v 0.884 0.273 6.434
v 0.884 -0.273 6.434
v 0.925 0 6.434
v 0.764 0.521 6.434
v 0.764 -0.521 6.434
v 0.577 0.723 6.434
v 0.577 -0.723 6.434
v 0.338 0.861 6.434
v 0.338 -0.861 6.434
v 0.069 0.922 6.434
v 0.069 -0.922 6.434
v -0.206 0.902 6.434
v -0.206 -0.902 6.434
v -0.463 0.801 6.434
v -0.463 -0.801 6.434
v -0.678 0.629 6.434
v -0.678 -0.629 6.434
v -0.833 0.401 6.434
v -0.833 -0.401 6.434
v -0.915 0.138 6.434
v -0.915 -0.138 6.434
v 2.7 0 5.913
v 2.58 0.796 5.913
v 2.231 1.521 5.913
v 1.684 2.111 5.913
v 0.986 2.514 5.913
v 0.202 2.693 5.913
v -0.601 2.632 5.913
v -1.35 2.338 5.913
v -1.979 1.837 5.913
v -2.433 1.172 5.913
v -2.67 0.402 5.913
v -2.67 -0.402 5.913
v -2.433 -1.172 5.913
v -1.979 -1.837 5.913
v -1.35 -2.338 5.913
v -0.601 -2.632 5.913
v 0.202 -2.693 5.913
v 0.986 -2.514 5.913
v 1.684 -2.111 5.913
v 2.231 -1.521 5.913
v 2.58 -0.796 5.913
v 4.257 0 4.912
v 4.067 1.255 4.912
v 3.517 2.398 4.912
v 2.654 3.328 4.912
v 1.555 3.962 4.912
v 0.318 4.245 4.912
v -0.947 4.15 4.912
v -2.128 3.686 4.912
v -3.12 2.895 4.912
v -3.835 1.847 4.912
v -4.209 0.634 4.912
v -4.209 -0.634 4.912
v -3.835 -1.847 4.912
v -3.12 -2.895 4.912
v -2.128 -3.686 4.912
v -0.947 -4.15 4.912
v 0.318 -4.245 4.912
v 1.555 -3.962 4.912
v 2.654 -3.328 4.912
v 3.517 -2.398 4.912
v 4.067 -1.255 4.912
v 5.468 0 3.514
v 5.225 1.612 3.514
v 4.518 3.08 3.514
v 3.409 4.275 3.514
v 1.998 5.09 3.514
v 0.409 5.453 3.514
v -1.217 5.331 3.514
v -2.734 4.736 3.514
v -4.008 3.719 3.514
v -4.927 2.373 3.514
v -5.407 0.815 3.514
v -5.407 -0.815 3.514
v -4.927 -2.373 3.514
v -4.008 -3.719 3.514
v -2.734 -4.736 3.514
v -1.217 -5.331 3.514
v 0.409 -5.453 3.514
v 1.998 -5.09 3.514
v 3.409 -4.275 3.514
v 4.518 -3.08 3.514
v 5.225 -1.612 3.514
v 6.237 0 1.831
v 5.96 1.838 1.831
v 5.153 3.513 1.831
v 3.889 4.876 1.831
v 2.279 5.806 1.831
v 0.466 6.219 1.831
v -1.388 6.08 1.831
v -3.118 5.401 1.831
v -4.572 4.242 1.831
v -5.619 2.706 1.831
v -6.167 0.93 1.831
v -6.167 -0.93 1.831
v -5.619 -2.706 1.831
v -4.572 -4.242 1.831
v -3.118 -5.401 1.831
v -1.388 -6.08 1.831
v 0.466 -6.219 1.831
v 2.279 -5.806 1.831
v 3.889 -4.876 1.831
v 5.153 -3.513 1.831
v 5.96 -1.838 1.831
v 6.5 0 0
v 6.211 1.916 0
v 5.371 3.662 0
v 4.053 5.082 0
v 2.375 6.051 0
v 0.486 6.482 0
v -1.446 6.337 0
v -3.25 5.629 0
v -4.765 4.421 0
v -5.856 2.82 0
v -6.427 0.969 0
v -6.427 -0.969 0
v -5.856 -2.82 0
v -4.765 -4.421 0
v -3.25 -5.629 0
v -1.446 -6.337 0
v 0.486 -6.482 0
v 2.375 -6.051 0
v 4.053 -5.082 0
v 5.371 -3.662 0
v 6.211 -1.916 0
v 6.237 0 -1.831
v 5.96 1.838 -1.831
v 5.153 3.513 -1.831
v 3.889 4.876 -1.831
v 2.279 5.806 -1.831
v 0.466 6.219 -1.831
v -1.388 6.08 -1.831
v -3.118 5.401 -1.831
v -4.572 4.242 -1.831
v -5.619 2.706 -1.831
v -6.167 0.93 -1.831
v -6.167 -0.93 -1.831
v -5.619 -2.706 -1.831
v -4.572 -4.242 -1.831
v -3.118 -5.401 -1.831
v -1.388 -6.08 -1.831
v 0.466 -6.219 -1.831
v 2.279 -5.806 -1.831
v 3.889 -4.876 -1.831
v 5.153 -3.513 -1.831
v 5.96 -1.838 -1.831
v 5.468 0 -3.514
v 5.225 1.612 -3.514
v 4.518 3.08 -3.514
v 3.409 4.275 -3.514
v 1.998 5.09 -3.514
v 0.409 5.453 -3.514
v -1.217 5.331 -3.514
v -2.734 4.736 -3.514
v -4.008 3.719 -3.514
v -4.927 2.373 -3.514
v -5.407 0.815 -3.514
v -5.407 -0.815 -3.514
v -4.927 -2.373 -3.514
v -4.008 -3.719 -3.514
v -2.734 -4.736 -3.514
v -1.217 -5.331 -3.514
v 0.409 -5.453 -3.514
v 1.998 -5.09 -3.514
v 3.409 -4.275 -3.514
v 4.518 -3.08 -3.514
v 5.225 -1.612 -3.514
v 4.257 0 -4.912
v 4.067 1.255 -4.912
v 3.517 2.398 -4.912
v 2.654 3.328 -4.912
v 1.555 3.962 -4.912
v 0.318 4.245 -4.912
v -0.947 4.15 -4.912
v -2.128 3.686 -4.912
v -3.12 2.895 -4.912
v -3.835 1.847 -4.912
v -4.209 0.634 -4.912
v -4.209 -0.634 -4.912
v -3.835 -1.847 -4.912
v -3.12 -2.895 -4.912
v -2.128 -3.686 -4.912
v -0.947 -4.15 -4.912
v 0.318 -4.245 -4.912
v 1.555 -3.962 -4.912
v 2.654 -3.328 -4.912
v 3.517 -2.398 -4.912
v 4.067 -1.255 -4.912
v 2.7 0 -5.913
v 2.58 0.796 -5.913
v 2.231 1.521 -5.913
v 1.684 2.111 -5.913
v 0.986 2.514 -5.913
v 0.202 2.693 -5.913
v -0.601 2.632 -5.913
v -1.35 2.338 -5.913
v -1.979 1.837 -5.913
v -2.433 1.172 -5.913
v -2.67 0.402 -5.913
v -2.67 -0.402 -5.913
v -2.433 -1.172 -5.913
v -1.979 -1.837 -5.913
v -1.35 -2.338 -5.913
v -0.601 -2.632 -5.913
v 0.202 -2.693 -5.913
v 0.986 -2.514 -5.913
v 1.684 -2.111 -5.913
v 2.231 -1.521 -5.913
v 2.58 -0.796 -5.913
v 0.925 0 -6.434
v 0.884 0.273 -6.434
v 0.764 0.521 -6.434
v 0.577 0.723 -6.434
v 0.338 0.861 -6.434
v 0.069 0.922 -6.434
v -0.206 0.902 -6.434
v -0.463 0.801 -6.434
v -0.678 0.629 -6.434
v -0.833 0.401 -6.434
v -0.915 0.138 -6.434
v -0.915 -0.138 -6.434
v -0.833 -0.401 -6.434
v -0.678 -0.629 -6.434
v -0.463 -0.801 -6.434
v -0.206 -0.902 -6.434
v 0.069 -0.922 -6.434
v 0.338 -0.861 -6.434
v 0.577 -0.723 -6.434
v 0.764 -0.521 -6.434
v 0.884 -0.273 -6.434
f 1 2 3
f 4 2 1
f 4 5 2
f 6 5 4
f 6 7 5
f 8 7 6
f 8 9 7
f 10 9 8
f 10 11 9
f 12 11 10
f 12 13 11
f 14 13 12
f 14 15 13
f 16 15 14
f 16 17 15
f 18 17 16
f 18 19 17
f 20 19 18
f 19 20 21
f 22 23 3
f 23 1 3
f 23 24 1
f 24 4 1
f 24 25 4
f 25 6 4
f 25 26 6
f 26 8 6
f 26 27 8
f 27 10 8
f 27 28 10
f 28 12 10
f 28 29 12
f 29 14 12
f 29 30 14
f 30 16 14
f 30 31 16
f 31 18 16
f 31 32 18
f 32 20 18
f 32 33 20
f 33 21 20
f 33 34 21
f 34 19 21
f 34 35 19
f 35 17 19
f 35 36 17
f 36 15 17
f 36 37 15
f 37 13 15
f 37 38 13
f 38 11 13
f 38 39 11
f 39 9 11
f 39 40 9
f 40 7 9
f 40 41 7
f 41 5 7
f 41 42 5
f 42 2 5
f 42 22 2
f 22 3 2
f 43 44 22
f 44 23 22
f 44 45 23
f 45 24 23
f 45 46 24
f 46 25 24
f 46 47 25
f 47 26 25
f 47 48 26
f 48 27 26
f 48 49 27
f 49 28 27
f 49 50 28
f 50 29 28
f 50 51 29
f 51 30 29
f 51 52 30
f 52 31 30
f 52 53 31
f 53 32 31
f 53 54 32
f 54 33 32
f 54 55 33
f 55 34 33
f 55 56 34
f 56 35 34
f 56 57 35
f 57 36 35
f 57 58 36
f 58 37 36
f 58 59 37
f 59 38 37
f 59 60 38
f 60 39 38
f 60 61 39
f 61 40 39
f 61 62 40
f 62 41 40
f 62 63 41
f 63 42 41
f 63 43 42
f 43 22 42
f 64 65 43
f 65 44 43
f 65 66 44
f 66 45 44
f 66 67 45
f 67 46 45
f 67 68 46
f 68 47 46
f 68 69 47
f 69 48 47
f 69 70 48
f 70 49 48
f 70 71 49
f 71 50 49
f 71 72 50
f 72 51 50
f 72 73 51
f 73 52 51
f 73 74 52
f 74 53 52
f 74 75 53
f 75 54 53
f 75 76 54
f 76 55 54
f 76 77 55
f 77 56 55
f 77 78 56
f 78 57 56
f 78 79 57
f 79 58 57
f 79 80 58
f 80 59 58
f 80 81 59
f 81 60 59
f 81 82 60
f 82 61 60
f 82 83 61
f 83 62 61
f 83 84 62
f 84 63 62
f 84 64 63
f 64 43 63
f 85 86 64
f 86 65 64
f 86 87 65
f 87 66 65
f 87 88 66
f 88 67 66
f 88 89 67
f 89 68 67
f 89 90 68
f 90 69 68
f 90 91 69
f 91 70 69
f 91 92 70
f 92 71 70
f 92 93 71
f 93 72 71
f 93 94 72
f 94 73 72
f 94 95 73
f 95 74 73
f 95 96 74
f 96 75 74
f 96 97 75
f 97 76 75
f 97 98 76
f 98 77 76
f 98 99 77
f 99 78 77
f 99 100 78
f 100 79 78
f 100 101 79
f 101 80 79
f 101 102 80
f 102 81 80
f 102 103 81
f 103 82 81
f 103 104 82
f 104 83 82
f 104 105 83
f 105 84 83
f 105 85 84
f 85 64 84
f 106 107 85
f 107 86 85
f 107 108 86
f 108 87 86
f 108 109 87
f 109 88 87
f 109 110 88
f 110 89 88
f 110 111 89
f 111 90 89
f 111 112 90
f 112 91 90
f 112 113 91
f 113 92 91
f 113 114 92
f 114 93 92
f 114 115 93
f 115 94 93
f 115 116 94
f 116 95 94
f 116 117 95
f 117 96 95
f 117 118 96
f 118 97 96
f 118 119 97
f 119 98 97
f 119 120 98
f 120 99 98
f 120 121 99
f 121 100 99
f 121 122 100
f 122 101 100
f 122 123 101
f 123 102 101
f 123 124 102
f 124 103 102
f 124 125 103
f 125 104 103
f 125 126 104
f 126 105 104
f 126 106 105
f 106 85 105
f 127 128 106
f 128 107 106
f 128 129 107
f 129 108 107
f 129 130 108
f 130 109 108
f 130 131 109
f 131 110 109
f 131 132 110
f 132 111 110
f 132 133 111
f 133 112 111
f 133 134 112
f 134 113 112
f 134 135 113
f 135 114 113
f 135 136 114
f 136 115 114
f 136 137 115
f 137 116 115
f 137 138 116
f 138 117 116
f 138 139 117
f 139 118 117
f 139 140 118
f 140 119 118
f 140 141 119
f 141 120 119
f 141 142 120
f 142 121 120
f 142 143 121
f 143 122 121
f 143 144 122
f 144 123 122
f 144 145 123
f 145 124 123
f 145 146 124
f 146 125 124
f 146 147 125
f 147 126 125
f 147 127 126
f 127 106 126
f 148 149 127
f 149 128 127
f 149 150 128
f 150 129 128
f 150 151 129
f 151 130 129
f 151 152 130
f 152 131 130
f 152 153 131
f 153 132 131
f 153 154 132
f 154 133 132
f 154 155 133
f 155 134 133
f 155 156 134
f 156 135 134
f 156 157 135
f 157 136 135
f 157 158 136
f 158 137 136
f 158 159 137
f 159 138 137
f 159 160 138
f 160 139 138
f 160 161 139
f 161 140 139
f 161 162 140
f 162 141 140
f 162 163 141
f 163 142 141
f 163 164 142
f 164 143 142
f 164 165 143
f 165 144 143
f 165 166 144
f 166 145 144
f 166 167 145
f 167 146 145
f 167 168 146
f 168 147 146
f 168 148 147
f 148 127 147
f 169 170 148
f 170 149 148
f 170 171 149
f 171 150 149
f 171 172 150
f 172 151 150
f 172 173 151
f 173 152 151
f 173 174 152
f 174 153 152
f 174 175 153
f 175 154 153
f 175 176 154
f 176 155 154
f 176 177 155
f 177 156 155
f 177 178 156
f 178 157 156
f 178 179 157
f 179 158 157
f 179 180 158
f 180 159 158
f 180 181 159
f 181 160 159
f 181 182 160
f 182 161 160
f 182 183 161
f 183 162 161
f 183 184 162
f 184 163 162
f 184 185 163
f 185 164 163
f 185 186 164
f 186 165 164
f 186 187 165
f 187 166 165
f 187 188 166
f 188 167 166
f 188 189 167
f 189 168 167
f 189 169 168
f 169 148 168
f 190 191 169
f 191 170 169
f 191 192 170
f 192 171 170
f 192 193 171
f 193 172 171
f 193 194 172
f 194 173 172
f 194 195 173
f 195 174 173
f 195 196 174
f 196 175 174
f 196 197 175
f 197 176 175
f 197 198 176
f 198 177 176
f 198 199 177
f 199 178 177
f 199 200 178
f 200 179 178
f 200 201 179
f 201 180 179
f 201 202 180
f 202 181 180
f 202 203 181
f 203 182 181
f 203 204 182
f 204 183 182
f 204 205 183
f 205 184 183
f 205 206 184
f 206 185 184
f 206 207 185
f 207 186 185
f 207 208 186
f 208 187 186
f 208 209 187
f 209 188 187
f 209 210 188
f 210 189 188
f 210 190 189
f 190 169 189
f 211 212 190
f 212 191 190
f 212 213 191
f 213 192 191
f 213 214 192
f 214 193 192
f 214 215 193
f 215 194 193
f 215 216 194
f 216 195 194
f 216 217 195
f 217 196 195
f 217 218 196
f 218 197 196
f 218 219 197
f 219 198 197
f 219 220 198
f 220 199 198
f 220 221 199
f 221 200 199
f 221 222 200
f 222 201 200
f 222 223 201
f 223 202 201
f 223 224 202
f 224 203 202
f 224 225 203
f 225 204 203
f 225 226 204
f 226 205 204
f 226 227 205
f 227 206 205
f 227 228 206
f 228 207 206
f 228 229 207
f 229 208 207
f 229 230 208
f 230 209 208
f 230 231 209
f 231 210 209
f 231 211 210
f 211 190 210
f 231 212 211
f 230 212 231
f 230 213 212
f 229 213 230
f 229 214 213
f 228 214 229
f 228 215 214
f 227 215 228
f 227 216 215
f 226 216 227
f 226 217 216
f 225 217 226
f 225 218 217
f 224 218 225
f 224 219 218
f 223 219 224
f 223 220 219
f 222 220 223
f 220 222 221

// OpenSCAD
// Generated by SolidPython 1.0.1 on 2020-07-29 00:02:42


sphere(d = 13, r = 7);
/***********************************************
*********      SolidPython code:      **********
************************************************
 
# import packages: SolidPython
from solid import *
from solid.utils import *
from itertools import chain, combinations


class Resize:

    def __init__(self, scad_file):
        self.scad_file = scad_file
        #self.scad_file = import_scad(scad_file)
        # cone/cylinder param:
        self.r1 = 0
        self.r2 = 0
        self.h = 0
        # rectangular prism param:
        self.w = 0
        self.l = 0
        # ellipse param:
        self.r = 0

    # import OpenScad code (file name corresponds to shape)


    # classify shape + parameters
    def assign(self, param1, param2, param3):
        if self.scad_file == 'cone.scad':
            self.r1 = param1
            self.r2 = param2
            self.h = param3
        elif self.scad_file == 'cylinder.scad':
            self.r1 = param1
            self.r2 = param2
            self.h = param3
        elif self.scad_file == 'rectangularPrism.scad':
            self.h = param1
            self.l = param2
            self.w = param3
        else:
            self.r = param1
            self.h = param2

    # resize parameters
    def iterate(self):
        x = range(3, 20, 2)
        i = 1
        if self.scad_file == 'cone.scad':
            tempList = list(combinations(x, 3))
            #print(tempList)
            for i in x:
                for j in range (3):
                    param1 = tempList[i][0]
                    param2 = tempList[i][1]
                    param3 = tempList[i][2]
                    filepath = 'produced_scad_files/' + 'cone' + str(param1) + '_' + str(param2) + '_' + str(param3) + '.scad'
                    scad_render_to_file(cylinder(h=param1, r1=param2, r2=param3), filepath)

        elif self.scad_file == 'cylinder.scad':
            tempList = list(combinations(x, 3))
            for i in x:
                for j in range(3):
                    param1 = tempList[i][0]
                    param2 = tempList[i][1]
                    param3 = tempList[i][2]
                    filepath = 'produced_scad_files/' + 'cylinder' + str(param1) + '_' + str(param2) + '_' + str(param3) + '.scad'
                    scad_render_to_file(cylinder(h=param1, r1=param2, r2=param3), filepath)

        elif self.scad_file == 'rectangularPrism.scad':
            tempList = list(combinations(x, 3))
            for i in x:
                for j in range(3):
                    param1 = tempList[i][0]
                    param2 = tempList[i][1]
                    param3 = tempList[i][2]
                    filepath = 'produced_scad_files/' + 'rectangularPrism' + str(param1) + '_' + str(param2) + '_' + str(
                        param3) + '.scad'
                    scad_render_to_file(cube(size=(param1, param2, param3)), filepath)

        else:
            tempList = list(combinations(x, 2))
            for i in x:
                for j in range(3):
                    param1 = tempList[i][0]
                    param2 = tempList[i][1]
                    filepath = 'produced_scad_files/' + 'ellipse' + str(param1) + '_' + str(param2) + '_' + '.scad'
                    scad_render_to_file(sphere(param1, param2), filepath)

    def render_to_scadfile(self):
        scad_render_to_file(scad, 'example.scad') 
 
************************************************/
